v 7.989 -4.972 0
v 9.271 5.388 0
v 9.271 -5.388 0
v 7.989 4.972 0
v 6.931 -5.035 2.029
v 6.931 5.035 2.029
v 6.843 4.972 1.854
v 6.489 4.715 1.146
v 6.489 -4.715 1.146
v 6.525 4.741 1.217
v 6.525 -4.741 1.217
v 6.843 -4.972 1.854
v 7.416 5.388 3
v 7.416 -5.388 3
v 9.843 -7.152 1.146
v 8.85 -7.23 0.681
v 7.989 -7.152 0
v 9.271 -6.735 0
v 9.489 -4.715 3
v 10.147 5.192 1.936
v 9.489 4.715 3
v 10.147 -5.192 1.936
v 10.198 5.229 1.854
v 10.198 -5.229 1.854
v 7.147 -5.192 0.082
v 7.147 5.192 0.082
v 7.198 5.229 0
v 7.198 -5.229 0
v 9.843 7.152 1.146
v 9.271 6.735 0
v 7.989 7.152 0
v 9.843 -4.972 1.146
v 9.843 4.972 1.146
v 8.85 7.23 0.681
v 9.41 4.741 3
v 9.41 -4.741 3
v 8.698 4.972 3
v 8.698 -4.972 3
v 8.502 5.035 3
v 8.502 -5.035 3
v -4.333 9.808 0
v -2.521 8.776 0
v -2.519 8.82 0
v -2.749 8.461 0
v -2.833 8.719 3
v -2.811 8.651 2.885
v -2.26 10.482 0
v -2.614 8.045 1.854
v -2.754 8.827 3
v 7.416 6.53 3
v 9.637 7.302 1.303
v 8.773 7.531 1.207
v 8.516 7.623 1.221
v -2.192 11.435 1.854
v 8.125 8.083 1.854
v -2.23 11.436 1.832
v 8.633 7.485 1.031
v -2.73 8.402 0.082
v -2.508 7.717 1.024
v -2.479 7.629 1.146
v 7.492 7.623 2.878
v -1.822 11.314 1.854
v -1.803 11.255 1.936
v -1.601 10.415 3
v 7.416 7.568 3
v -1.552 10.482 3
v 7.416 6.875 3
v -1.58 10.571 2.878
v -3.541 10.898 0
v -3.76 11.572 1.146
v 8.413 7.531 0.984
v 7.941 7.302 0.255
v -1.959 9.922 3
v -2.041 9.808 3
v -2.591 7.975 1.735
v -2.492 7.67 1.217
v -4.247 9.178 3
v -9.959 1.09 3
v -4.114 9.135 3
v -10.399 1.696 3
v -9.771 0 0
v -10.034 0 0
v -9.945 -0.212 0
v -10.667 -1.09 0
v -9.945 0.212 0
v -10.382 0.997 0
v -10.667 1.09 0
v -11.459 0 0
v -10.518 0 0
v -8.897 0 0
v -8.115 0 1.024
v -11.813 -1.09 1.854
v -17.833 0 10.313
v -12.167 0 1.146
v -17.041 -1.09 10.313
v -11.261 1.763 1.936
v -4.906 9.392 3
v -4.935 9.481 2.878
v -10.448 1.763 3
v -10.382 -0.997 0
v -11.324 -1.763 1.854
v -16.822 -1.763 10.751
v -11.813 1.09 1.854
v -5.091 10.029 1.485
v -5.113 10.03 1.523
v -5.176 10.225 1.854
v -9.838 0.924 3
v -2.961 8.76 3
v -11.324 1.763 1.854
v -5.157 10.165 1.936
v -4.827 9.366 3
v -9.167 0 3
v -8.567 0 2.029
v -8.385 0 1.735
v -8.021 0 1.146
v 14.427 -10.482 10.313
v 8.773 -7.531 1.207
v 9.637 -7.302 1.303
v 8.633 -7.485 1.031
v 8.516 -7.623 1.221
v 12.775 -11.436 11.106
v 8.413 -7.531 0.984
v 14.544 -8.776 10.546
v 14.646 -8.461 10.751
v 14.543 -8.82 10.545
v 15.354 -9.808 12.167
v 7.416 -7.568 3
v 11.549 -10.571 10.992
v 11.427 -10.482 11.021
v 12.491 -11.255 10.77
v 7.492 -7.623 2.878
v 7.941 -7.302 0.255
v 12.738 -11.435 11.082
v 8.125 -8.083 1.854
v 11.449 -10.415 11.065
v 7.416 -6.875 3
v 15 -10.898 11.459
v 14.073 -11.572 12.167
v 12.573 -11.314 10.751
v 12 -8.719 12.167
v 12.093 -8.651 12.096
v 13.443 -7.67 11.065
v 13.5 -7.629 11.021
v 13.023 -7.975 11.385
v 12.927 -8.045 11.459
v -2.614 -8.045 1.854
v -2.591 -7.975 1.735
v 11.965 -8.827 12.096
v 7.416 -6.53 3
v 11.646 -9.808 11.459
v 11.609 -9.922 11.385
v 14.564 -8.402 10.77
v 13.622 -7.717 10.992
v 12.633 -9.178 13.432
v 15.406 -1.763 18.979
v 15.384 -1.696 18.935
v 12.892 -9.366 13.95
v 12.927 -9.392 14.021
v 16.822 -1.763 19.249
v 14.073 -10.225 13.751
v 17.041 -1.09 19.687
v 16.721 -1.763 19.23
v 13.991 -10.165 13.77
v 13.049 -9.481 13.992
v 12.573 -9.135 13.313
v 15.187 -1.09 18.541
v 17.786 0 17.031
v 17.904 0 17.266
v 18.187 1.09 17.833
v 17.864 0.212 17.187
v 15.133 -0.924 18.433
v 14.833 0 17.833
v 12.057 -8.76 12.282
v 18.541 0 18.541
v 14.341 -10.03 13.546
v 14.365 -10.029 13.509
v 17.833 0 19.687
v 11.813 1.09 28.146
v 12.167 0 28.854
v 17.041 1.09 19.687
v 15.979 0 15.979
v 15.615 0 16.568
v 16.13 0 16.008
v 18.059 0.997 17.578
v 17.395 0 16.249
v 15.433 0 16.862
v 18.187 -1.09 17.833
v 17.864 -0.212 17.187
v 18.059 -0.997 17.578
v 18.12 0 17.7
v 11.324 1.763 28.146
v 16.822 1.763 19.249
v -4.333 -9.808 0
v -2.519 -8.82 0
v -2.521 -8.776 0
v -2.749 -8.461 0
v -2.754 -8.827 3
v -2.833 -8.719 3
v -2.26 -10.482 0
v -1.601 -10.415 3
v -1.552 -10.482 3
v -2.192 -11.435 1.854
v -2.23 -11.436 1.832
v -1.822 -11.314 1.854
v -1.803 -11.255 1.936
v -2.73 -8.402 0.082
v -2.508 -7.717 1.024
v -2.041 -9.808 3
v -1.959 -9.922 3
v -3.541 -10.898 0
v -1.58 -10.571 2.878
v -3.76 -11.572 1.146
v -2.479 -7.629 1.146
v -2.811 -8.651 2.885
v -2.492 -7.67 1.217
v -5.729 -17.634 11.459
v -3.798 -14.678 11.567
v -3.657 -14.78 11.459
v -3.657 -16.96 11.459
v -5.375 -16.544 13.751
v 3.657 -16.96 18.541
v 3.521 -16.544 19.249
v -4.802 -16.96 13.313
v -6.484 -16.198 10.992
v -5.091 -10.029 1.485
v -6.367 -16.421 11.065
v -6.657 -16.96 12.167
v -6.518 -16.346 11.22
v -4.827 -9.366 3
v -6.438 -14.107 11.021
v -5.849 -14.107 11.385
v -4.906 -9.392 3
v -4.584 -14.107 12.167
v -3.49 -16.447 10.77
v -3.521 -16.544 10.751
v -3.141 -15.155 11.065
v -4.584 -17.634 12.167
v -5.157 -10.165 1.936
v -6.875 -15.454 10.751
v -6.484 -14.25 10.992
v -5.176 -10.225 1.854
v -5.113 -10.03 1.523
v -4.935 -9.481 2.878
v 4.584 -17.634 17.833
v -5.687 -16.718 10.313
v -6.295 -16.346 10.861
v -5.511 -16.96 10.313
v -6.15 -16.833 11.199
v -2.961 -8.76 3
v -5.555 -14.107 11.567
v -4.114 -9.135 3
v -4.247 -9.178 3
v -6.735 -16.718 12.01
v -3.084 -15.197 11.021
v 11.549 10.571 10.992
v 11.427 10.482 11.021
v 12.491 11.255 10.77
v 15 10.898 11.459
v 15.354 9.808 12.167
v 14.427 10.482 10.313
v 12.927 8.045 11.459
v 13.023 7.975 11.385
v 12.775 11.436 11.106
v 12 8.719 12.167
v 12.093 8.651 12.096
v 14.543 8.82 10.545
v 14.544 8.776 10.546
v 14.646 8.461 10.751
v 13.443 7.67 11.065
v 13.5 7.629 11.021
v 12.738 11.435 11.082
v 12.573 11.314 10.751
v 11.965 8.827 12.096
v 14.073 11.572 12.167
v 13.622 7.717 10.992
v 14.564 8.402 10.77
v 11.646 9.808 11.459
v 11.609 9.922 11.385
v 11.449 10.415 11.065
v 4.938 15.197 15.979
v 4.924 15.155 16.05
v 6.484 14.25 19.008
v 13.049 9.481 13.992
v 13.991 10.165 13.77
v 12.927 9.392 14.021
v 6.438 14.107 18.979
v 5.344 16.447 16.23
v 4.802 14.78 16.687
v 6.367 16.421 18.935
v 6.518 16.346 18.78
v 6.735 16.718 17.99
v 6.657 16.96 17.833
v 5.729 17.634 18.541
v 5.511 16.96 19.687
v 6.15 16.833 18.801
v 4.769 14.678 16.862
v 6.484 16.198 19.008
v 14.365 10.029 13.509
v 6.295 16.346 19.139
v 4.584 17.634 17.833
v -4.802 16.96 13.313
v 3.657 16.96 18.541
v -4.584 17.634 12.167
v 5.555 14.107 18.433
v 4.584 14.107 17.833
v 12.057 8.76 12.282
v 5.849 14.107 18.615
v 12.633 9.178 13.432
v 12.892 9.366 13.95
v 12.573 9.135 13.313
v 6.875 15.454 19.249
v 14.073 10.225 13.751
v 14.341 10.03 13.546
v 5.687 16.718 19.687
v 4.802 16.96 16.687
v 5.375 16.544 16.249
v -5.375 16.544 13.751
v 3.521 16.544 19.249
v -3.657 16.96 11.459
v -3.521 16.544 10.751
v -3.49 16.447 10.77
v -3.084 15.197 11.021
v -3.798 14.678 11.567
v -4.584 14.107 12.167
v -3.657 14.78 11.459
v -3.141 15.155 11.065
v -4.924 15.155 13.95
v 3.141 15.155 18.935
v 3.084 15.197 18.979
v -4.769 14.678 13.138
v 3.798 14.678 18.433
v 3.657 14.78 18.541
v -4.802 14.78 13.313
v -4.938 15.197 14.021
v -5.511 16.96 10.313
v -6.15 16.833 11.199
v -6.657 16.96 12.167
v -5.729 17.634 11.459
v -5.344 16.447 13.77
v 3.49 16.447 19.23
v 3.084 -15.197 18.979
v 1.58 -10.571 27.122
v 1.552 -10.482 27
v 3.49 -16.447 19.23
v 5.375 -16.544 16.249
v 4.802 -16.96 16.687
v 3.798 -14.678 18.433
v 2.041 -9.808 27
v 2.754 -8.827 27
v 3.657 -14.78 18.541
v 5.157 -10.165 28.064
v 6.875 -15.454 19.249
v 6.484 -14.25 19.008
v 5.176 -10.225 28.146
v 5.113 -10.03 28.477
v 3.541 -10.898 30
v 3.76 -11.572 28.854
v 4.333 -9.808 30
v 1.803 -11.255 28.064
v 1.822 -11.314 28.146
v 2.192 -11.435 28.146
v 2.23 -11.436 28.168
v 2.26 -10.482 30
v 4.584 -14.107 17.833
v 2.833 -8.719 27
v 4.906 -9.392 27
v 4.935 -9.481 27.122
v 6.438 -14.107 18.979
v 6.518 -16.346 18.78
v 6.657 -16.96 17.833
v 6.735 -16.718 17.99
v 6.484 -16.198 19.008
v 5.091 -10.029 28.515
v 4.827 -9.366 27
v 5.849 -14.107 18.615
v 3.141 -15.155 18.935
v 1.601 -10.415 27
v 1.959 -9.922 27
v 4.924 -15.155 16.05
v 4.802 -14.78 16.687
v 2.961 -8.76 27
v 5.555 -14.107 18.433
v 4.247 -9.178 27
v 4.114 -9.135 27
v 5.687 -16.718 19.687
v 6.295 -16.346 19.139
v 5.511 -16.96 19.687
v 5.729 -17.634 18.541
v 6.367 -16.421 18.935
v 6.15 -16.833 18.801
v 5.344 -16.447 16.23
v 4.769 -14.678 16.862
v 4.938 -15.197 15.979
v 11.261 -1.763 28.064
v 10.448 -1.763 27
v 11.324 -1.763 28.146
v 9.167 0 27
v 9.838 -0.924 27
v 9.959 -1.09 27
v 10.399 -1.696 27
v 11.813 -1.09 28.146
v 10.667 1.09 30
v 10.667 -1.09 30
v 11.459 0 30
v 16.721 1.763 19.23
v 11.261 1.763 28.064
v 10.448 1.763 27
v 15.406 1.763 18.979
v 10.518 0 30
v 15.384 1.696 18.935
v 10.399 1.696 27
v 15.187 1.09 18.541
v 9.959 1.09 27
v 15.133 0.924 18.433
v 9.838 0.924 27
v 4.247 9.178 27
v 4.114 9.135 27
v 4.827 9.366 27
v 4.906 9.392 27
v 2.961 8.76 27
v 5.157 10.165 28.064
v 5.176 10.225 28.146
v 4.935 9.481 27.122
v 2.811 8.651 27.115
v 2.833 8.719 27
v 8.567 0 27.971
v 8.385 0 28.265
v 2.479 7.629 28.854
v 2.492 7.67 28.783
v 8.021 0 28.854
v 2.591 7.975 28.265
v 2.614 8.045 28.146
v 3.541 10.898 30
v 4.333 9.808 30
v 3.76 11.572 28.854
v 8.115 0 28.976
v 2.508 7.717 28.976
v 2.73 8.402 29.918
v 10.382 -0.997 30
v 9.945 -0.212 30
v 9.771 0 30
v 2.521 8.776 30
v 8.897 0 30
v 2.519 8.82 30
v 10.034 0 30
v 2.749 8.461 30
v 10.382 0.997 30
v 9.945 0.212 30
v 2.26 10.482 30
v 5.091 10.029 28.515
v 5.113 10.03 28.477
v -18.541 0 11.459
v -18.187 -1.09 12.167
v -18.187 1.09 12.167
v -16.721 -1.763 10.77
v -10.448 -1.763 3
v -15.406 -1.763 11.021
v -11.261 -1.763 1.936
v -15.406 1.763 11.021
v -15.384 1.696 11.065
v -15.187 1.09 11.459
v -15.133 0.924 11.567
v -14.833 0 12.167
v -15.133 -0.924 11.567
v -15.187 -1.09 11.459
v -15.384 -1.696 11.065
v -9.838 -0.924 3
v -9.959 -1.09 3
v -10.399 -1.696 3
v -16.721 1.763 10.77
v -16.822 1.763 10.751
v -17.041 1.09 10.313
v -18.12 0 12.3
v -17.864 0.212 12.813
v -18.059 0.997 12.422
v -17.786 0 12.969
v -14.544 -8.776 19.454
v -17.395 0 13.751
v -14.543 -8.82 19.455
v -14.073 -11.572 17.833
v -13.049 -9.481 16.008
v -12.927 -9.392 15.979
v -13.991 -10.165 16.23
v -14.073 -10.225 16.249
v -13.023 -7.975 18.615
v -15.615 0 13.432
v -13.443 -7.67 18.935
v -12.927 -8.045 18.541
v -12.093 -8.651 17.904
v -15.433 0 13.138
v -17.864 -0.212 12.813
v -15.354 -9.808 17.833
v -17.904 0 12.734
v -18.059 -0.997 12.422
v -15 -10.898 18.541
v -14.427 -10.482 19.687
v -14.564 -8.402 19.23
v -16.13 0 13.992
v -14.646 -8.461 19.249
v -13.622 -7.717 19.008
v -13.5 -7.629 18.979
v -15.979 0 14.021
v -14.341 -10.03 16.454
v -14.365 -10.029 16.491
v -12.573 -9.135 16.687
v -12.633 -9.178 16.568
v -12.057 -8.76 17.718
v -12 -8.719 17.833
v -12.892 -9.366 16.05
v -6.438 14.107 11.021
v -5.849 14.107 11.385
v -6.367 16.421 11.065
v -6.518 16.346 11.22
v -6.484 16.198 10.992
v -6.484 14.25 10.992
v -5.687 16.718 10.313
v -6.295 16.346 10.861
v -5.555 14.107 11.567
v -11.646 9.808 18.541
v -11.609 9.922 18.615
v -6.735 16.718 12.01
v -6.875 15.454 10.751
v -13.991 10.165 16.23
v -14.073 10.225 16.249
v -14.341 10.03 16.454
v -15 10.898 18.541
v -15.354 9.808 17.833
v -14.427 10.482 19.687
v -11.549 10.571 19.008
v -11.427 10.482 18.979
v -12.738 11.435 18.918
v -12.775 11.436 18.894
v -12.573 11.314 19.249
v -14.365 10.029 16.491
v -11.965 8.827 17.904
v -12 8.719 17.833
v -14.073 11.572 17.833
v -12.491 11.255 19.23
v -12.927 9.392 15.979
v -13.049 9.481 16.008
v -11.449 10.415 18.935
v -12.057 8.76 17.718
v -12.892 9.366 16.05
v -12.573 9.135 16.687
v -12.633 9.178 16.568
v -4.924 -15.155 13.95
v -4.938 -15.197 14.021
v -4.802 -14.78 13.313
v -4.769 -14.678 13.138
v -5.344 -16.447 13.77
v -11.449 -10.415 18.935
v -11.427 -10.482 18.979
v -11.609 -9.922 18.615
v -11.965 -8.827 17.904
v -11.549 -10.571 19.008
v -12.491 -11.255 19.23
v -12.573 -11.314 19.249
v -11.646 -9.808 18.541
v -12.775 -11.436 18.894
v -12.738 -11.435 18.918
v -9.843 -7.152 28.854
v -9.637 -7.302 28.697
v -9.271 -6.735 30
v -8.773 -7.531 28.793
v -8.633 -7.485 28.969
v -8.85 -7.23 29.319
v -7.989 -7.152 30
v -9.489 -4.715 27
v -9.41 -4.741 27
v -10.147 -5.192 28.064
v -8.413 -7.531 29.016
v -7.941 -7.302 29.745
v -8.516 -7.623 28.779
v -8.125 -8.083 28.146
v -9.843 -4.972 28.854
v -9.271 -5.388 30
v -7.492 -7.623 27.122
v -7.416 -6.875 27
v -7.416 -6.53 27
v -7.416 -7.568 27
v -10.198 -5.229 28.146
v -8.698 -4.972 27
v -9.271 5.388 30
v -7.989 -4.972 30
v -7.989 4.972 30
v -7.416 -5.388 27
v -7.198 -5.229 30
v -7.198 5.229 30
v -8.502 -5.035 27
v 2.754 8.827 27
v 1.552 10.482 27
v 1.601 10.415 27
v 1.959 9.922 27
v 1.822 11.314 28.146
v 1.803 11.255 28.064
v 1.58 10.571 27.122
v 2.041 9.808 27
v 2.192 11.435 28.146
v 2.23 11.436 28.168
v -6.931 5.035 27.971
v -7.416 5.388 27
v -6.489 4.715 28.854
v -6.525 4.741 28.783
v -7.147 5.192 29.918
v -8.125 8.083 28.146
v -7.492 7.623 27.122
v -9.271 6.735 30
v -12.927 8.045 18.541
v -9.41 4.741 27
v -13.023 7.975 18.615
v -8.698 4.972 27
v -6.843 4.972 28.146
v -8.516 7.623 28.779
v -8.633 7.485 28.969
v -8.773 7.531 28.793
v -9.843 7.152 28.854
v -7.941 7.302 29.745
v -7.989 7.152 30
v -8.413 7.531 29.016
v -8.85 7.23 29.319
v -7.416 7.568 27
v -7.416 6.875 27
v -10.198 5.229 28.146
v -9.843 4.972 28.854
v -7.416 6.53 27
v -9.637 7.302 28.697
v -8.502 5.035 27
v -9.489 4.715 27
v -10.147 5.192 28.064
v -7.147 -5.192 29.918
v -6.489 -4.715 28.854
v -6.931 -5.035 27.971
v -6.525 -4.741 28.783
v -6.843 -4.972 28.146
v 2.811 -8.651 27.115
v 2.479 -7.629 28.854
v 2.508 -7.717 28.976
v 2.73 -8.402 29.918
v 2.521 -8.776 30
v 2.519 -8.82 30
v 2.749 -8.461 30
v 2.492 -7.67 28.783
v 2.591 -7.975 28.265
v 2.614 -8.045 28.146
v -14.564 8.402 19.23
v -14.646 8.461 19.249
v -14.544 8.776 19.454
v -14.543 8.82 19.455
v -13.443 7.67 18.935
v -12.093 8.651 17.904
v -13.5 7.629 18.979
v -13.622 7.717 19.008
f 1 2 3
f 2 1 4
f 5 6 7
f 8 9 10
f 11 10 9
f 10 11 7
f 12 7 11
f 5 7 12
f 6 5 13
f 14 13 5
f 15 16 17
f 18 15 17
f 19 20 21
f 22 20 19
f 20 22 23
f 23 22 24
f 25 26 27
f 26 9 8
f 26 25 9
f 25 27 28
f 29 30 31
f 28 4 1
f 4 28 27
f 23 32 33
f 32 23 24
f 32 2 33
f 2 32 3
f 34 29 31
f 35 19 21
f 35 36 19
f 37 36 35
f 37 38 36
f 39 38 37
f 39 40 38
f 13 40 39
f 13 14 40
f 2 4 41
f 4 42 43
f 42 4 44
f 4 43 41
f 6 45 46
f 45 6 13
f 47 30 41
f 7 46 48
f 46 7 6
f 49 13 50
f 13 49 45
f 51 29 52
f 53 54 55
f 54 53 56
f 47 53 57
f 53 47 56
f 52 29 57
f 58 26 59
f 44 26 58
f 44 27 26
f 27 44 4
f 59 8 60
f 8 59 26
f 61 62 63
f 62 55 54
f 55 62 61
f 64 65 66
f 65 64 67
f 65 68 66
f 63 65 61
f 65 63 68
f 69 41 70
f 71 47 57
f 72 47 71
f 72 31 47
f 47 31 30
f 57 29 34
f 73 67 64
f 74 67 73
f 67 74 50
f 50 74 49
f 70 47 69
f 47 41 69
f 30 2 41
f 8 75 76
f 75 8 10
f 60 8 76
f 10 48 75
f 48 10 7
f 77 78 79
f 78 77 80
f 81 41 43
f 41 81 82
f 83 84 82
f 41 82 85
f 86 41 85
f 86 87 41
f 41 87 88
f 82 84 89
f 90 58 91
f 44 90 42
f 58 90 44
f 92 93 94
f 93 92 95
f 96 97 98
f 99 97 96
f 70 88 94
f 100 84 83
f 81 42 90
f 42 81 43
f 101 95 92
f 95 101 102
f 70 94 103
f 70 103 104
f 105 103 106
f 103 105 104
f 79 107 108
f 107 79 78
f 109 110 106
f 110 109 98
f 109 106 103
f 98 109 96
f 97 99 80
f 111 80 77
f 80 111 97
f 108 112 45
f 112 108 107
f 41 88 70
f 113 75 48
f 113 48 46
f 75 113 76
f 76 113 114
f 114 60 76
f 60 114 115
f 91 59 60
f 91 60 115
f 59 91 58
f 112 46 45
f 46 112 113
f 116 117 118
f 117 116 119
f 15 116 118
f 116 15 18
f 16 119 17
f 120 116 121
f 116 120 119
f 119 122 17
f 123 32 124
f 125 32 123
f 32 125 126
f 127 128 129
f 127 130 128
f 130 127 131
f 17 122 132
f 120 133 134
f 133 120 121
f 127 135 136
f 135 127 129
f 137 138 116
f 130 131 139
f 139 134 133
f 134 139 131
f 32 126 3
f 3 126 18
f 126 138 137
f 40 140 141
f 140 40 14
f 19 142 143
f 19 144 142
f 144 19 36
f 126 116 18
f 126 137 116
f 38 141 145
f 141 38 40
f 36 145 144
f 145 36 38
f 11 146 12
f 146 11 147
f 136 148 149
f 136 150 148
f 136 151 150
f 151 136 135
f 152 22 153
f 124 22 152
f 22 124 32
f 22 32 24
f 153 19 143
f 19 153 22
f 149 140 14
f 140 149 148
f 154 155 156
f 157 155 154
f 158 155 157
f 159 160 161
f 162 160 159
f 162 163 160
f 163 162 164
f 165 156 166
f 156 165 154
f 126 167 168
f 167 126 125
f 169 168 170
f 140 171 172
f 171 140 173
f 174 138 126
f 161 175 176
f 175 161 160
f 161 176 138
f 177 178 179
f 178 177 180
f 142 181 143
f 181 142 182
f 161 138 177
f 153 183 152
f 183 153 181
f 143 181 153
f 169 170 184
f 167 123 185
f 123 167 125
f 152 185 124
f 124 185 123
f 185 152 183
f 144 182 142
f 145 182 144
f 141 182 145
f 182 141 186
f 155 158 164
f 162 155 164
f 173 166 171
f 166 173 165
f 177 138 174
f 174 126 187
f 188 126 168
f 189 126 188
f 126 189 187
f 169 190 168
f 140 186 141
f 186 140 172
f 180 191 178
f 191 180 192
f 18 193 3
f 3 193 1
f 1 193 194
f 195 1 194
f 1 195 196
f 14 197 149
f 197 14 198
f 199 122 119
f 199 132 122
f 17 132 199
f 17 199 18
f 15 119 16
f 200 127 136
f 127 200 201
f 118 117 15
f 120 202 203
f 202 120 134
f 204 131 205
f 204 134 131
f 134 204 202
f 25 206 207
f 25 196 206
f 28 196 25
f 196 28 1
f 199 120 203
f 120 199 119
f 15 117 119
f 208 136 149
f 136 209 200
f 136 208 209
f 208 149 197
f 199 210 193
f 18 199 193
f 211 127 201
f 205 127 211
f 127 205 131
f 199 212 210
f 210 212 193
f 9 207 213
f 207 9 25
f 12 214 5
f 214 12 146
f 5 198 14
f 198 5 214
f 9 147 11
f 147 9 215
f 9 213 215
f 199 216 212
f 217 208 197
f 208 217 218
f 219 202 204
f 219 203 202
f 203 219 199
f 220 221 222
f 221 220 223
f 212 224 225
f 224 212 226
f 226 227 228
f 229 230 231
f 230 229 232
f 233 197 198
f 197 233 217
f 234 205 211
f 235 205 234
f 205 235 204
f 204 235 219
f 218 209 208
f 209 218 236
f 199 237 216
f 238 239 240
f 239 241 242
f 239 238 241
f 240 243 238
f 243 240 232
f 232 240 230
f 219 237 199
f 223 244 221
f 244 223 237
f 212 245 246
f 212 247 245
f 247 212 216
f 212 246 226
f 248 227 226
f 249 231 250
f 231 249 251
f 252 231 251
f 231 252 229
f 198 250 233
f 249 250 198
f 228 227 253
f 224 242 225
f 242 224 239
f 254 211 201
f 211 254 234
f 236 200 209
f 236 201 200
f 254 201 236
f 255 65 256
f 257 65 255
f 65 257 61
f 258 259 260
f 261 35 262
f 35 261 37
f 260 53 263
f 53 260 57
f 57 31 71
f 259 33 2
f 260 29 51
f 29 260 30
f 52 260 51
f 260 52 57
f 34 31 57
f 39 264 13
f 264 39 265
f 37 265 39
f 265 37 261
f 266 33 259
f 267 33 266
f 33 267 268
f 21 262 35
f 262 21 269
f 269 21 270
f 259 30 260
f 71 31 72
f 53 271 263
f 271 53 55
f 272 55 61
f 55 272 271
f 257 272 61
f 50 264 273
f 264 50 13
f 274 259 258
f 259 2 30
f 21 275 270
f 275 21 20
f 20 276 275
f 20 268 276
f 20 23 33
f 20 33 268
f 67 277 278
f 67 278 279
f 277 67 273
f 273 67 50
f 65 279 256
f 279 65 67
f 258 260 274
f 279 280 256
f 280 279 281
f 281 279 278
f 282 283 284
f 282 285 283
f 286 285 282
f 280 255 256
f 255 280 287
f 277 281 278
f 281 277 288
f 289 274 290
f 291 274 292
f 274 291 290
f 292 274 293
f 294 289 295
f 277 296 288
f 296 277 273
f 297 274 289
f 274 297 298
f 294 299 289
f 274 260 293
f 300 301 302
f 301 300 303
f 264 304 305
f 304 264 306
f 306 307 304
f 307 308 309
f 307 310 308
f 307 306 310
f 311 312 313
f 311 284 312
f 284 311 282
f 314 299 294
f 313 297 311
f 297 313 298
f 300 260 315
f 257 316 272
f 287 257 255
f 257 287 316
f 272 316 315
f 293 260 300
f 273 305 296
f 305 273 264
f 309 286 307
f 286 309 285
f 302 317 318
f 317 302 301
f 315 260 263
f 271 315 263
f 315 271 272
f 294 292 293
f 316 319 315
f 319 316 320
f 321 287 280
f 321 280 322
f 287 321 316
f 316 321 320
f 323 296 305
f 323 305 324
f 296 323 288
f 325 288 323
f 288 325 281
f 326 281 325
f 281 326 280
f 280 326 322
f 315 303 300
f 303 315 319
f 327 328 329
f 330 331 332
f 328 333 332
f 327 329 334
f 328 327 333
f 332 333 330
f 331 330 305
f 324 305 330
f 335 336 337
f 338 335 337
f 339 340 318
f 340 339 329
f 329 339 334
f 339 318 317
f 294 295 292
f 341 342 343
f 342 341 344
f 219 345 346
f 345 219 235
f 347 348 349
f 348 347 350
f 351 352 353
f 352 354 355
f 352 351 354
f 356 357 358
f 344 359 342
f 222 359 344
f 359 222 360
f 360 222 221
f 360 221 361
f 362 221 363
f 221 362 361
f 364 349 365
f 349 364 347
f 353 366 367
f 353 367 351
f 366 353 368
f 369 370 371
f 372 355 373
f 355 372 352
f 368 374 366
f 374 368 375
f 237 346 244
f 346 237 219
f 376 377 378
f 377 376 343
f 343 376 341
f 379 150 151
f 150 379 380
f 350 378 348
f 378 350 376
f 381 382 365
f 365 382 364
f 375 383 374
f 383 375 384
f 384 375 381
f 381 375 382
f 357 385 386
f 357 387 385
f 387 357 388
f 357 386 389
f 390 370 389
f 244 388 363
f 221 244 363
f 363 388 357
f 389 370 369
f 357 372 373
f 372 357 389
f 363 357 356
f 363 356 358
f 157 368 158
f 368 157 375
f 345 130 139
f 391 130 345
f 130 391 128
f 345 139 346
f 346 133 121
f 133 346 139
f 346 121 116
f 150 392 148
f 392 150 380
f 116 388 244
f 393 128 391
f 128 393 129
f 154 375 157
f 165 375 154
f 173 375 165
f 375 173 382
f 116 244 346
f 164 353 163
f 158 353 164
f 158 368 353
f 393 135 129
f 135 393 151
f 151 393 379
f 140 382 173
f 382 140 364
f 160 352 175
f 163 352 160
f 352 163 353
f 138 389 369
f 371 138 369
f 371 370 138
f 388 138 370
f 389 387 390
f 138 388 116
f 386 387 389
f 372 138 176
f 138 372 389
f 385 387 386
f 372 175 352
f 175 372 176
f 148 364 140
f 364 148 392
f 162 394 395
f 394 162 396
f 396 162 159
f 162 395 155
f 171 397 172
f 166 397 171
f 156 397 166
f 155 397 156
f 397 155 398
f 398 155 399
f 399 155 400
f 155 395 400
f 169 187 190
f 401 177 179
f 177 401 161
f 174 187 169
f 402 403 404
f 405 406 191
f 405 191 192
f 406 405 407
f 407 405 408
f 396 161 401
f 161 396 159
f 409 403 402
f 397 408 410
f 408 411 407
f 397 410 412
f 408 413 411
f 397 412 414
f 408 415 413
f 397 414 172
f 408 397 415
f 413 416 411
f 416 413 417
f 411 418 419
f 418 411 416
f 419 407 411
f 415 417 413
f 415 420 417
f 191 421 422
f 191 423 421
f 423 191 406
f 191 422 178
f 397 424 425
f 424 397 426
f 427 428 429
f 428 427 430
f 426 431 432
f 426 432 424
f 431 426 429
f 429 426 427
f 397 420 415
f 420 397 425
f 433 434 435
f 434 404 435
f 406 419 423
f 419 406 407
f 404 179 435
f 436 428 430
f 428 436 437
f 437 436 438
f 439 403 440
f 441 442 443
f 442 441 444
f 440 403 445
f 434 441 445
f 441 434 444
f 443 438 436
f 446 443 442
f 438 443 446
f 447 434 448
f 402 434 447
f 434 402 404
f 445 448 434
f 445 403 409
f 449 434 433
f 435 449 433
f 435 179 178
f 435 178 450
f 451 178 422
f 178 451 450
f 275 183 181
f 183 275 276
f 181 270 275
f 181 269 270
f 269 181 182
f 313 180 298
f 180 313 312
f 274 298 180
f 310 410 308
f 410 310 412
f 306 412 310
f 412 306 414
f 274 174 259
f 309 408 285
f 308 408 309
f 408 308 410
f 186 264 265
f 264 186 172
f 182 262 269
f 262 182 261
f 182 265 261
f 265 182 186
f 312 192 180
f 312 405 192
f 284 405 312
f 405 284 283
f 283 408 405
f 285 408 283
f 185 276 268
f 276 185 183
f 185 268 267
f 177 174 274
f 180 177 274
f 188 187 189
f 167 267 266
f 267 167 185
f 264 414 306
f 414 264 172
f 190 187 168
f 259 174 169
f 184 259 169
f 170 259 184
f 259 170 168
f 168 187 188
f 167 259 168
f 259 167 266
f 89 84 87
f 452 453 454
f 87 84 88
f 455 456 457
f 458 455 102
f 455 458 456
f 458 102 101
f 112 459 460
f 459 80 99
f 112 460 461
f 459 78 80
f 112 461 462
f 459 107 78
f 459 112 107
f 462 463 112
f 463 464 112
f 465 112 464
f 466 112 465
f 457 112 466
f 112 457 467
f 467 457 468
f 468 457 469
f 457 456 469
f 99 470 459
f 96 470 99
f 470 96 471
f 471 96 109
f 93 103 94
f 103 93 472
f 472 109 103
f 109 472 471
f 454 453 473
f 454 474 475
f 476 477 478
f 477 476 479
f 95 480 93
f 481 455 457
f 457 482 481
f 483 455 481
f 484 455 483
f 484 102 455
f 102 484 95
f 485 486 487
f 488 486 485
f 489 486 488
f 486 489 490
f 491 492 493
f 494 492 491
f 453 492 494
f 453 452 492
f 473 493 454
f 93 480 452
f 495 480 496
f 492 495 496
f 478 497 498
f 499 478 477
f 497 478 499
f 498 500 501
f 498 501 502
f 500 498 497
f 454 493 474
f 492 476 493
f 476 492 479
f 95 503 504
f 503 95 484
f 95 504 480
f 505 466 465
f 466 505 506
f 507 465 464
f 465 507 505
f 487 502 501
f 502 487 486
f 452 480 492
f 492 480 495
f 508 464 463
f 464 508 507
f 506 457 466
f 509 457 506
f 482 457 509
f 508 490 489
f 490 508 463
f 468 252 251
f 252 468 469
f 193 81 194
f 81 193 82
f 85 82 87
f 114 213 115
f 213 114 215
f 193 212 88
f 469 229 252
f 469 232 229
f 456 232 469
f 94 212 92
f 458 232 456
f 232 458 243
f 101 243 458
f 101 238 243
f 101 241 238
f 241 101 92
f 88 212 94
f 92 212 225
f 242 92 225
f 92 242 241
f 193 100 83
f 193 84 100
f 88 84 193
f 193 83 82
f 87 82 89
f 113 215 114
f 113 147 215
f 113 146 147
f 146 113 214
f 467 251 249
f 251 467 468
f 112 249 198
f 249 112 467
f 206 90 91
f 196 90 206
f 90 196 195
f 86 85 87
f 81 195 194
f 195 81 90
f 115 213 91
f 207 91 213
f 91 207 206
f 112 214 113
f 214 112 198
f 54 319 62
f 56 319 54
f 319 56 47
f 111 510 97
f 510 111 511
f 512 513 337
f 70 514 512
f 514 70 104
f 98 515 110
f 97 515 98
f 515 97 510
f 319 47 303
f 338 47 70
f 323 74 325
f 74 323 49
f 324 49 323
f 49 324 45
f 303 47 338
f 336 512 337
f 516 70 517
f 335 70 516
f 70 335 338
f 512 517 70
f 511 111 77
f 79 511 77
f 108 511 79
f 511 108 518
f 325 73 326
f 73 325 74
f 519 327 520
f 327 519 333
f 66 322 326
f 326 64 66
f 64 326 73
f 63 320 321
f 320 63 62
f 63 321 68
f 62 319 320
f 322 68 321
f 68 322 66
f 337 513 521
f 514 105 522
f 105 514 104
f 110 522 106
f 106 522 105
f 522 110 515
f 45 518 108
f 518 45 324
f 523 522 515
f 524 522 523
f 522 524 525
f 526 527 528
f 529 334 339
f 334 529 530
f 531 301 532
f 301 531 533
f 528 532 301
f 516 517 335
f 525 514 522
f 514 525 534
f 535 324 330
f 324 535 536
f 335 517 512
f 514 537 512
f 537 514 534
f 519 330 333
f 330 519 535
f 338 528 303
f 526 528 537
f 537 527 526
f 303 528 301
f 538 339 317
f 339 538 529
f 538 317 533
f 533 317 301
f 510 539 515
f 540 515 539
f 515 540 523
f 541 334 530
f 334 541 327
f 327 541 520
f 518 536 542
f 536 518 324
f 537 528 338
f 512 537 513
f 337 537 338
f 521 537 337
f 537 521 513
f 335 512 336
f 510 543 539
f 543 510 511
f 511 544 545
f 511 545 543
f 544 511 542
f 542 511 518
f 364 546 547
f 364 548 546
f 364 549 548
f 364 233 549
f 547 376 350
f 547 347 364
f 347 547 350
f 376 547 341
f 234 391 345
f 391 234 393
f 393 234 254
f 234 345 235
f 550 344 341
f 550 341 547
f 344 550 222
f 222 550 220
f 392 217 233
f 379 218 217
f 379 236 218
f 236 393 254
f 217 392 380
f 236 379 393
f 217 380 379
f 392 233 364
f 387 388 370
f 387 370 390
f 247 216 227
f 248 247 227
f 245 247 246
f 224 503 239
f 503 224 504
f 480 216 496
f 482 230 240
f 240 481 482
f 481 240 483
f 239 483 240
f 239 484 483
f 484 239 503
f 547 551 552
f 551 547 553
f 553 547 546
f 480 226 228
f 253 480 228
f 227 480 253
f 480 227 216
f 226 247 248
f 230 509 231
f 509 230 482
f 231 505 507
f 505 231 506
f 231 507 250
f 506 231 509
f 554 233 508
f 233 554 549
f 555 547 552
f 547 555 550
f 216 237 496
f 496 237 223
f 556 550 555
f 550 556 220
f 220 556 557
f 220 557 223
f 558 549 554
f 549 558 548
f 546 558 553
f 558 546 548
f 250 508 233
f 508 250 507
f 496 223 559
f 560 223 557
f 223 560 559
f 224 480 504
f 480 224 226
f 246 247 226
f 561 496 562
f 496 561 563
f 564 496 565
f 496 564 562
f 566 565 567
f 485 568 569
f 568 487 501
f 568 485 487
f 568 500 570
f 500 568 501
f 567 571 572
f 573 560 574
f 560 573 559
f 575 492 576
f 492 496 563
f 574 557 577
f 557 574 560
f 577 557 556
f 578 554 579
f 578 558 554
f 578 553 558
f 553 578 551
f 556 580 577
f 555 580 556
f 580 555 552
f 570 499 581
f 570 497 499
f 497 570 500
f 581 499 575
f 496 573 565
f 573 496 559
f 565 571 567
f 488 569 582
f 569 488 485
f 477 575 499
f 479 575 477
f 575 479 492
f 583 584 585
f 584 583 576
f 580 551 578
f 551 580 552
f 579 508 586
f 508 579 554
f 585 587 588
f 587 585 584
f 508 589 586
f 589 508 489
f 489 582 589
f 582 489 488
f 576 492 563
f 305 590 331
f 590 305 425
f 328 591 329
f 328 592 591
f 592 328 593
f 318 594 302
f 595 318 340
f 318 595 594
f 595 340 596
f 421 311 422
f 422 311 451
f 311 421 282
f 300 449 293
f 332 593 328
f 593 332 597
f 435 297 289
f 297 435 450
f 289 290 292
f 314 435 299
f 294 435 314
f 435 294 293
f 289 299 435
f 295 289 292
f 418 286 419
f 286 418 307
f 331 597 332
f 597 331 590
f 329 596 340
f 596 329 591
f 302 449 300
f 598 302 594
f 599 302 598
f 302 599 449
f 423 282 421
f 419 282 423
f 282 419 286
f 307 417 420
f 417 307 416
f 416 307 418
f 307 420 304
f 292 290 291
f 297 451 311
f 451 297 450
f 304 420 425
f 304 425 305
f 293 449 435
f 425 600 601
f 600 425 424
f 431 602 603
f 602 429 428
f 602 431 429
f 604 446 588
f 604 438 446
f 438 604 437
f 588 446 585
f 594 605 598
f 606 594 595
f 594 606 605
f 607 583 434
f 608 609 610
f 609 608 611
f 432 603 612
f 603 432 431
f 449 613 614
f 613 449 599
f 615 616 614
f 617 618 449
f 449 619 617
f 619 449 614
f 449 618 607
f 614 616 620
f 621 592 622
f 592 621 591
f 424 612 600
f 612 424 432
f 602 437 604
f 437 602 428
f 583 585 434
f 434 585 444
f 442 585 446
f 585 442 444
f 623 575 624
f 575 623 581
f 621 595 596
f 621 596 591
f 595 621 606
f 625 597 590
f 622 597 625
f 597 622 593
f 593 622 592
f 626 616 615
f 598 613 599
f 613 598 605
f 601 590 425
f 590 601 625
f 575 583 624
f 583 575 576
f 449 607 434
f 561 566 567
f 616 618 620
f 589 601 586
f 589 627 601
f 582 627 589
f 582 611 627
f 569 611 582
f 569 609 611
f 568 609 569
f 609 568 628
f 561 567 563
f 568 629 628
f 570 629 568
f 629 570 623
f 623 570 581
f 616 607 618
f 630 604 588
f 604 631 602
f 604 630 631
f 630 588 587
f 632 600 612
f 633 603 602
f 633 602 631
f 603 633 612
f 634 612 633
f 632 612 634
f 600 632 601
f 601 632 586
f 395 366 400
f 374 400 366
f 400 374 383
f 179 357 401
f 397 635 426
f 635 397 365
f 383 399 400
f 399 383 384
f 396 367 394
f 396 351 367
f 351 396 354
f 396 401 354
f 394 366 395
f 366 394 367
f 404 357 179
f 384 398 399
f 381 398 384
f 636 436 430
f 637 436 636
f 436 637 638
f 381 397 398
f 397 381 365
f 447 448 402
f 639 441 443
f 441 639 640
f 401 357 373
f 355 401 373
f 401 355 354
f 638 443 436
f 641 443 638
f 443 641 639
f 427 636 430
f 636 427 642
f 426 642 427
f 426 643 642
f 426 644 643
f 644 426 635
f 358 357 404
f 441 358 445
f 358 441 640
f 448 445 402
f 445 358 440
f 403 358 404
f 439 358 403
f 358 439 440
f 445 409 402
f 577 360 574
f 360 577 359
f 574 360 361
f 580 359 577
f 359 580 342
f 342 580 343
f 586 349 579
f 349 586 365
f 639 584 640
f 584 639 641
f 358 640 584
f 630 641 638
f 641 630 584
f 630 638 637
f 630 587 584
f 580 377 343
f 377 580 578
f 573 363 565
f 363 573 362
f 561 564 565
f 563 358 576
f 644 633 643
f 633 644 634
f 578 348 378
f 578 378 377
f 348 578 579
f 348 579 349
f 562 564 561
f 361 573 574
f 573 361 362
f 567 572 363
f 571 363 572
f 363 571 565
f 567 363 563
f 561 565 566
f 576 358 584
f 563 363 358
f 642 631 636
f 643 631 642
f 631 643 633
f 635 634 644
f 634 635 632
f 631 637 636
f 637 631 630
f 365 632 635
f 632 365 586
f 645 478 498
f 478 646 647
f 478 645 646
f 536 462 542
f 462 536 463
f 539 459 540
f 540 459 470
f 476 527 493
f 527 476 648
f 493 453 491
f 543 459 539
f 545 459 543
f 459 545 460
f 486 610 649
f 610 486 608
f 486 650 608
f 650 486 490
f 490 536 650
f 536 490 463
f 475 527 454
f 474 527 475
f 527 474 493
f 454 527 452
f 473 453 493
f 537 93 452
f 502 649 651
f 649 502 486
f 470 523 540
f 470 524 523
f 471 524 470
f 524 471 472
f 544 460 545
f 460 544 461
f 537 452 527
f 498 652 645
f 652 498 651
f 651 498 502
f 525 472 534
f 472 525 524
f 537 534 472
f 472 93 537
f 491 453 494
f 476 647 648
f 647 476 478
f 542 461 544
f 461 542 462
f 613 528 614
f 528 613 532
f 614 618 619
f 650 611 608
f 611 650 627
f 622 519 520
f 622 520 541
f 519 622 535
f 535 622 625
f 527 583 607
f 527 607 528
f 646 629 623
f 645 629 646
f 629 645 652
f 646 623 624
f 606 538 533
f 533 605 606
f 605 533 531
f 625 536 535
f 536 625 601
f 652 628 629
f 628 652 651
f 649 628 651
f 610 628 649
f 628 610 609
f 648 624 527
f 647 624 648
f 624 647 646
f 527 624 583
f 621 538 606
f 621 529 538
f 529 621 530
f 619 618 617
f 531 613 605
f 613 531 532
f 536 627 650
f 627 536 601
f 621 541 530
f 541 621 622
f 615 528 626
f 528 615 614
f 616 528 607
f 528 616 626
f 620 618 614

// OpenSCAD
// shape height
sh = 30;
// border width
bw = 3;

include <../polyhedra.scad>;

poly_wire(dodecahedron);
